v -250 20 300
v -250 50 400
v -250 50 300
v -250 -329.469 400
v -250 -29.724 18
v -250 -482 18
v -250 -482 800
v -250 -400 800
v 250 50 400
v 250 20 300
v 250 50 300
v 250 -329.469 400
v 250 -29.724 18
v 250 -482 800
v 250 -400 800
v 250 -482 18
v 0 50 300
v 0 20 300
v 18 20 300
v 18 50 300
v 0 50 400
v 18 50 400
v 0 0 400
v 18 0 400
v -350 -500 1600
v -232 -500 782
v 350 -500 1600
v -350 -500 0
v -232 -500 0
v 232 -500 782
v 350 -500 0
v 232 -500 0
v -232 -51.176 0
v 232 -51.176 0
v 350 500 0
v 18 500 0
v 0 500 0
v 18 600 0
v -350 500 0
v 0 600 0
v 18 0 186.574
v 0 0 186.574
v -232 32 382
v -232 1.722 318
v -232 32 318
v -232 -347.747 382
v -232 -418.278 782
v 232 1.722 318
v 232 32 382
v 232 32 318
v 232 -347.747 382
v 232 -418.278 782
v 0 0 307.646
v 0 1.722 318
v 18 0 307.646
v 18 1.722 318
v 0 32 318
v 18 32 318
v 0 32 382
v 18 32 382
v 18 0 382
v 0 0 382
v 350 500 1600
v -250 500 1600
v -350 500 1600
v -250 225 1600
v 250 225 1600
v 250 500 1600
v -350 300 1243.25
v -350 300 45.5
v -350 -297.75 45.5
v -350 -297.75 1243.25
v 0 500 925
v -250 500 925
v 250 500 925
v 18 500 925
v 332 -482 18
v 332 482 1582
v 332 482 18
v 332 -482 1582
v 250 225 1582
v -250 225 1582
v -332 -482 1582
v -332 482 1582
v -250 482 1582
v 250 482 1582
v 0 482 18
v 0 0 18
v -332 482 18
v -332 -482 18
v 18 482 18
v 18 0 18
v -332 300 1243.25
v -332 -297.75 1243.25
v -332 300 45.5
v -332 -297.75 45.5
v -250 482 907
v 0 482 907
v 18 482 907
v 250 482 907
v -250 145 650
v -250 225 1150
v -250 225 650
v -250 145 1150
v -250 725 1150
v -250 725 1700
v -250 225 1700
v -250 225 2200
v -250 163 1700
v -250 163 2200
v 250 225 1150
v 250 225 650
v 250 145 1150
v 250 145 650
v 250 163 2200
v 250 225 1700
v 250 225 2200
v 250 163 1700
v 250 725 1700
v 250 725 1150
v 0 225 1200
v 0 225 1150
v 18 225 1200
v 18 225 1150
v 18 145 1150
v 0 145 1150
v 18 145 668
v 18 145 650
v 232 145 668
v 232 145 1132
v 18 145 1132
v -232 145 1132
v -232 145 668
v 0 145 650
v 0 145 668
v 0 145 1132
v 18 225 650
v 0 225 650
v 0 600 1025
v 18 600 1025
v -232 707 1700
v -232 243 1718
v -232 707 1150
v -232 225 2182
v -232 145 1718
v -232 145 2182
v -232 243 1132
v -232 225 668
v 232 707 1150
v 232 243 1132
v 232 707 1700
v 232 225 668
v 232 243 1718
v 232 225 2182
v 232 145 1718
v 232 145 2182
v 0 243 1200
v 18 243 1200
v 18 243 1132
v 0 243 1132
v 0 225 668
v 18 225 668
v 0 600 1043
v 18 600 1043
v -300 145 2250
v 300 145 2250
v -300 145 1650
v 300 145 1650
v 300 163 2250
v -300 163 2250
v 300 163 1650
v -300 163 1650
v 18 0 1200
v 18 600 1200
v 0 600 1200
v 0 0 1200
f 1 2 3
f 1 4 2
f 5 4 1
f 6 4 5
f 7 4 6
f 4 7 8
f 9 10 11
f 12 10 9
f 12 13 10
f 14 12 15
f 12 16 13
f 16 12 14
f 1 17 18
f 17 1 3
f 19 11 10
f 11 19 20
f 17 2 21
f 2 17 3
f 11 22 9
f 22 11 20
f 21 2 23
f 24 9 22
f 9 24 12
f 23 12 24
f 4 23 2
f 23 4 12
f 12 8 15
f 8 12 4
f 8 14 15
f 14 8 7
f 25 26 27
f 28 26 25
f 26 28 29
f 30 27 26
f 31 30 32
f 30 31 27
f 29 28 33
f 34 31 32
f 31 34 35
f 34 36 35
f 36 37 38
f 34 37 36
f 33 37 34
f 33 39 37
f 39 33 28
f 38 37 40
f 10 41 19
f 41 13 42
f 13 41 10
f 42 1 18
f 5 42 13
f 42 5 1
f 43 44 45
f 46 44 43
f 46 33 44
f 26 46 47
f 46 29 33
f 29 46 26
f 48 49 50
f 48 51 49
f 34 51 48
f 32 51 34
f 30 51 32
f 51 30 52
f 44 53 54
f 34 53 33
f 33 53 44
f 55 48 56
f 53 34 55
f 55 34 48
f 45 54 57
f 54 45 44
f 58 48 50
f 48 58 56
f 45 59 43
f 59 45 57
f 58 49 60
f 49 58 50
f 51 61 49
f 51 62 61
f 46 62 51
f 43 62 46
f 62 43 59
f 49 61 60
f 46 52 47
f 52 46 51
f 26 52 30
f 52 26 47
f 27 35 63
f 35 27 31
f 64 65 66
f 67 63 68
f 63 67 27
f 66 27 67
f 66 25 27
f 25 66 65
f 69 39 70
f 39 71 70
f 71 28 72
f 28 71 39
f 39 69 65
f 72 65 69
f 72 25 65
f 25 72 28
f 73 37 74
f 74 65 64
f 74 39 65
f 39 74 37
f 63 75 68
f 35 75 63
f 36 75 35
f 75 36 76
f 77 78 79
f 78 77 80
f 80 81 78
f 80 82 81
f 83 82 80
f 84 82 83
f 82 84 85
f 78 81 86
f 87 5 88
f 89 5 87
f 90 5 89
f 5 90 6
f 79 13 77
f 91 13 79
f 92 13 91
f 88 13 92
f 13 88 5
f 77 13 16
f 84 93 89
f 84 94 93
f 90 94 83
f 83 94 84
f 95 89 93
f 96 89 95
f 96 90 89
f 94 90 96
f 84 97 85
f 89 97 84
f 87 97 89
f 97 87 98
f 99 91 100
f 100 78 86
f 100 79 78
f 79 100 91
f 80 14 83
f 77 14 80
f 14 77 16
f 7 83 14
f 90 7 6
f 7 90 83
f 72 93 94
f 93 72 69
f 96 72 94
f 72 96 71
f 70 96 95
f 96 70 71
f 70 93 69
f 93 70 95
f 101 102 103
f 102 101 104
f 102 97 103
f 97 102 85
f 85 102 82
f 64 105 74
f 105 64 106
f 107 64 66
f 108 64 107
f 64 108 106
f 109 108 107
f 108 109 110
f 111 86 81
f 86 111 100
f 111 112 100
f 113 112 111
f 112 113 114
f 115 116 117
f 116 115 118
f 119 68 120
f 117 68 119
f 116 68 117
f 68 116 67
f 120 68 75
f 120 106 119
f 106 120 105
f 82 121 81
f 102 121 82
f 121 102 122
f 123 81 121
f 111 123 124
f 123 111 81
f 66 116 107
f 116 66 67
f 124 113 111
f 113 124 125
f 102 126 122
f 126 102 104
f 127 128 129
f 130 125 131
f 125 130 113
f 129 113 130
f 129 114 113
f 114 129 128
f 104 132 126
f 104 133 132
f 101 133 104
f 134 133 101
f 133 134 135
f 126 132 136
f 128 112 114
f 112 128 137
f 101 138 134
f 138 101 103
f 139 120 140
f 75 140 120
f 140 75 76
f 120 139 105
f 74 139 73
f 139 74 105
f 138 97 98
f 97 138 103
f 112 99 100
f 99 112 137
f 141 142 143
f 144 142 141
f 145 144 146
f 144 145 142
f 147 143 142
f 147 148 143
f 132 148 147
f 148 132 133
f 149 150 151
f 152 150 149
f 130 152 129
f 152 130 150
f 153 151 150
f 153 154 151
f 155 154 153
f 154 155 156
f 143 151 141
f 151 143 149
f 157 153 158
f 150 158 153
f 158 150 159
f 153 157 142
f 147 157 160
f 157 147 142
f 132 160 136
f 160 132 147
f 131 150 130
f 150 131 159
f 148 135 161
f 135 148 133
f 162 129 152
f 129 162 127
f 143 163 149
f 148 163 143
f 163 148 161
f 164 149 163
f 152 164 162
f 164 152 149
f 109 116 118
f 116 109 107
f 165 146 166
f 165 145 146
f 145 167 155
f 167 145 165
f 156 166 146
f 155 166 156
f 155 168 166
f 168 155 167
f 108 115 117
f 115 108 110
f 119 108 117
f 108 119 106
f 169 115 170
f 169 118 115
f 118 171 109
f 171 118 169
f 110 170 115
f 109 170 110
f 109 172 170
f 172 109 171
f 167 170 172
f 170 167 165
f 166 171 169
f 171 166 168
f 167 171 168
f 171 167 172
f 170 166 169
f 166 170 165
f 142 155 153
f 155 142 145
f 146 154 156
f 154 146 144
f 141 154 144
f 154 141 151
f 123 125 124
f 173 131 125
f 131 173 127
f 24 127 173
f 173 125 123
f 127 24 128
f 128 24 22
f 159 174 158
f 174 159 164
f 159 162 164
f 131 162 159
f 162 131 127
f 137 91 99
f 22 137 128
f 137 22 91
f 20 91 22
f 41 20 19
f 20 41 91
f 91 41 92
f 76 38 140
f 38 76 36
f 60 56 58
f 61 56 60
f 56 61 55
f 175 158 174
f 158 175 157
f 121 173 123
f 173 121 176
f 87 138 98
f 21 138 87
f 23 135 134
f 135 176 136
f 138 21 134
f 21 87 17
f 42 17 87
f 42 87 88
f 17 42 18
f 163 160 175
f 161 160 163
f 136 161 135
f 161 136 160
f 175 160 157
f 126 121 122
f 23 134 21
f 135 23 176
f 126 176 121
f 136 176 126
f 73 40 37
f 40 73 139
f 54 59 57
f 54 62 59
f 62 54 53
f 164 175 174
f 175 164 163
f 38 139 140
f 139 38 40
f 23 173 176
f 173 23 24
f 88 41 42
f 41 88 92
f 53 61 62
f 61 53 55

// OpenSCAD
// file: ../shared/half_periscope.scad
diameter=10;
horizontal_leg=3;
vertical_leg=7;
wall_thickness=0.5;
flange=3;

module half_periscope(
    d=diameter,
    h=horizontal_leg,
    v=vertical_leg,
    w=wall_thickness,
    f=flange   
) {

  translate([-d/2,-(h+d/2),-d-v])
    rotate([90,0,90])
        difference(){
            union() {
            linear_extrude(d)
                polygon([[0,0], [h,0], [d+h,d], [d+h,d+v],[h,d+v],[h,d],[0,d]]);
             translate([0,-f/2,-f/2])
                cube([w,d+f,d+f]);
            }
            translate([0,0,w])
                linear_extrude(d-w-w)
                    polygon([[-w,w], [h,w], [d+h-w,d], [d+h-w,d+v+w],[h+w,d+v+w],[h+w,d-w],[-w,d-w]]);
    }  
    
  
        
   
}

half_periscope();
// file: ../shared/periscope.scad
diameter=20;
top_horizontal_tube_length=5;
top_flange=6;
bottom_horizontal_tube_length=2;
bottom_flange=3;
height=60;
wall_thickness=1;
twist=180;

use <half_periscope.scad>

module periscope(
    d=diameter,
    th=top_horizontal_tube_length,
    tf=top_flange,
    bh=bottom_horizontal_tube_length,
    bf=bottom_flange,
    h=height,
    w=wall_thickness,
    t=twist
) {
    translate([0,0,h/2])
    union() {
        half_periscope(d,bh,(h/2)-d,w,bf);
        translate([0,0,-w])
            rotate([0,180,t])
                half_periscope(d,th,((h/2)-d)+w,w,tf);
    }
}

periscope();
// file: ../shared/hollow_chair.scad
width=40;
height=80;
depth=55;
back_top=10;
top_angle=80;
seat_elevation=40;
seat_height=10;
seat_overhang=3;
bottom_angle=80;
wall_thickness=1.5;

module hollow_chair(
    w=width,
    h=height,
    d=depth,
    bt=back_top,
    ta=top_angle,
    se=seat_elevation,
    sh=seat_height,
    so=seat_overhang,
    ba=bottom_angle,
    wt=wall_thickness
){
    rotate([90,0,90])
    difference(){
    linear_extrude(w)
    polygon([
        [0,0],
        [d-so-tan(90-ba)*(se-sh),0],
        [d-so,se-sh],
        [d,se-sh],
        [d,se],
        [bt+tan(90-ta)*(h-se),se],
        [bt,h],
        [0,h]
    ]);
        translate([0,0,wt])
    linear_extrude(w-(2*wt))
    polygon([
        [-wt,-wt],[d-so-tan(90-ba)*(se-sh)-(wt/cos(90-ba)),-wt],
        [d-so-tan(90-ba)*(se-sh)-(wt/cos(90-ba)),0],
        [d-so-(wt/cos(90-ba)),se-sh+wt],
        [d-wt,se-sh+wt],
        [d-wt,se-wt],
        [bt+tan(90-ta)*(h-se)-(wt/cos(90-ta)),se-wt],
        [bt-(wt/cos(90-ta)),h-wt],
        [-wt,h-wt]
    ]);
}
    
 

}



hollow_chair();
// file: ../shared/box.scad
width =100;
depth =50;
height=200;
wall_thickness=1;

module box(w=width,d=depth,h=height,t=wall_thickness) {
    translate([0,0,h/2])
        difference() {
            cube([w,d,h],true);
            cube([w-2*t,d-2*t,h-2*t],true);
        }
}

box();
// main file
box_width=700;
box_height=1600;
box_depth=1000;
box_wall_thickness=18;

chair_width=500;
chair_height=800;
chair_depth=550;
chair_back_top=100;
chair_top_angle=80;
chair_seat_elevation=400;
chair_seat_height=100;
chair_seat_overhang=30;
chair_bottom_angle=80;
chair_wall_thickness=18;

periscope_diameter=500;
periscope_top_horizontal_tube_length=80;
periscope_top_flange=100;
periscope_bottom_horizontal_tube_length=80;
periscope_bottom_flange=0;
periscope_height=1550;
periscope_wall_thickness=18;
periscope_twist=0;
periscope_elevation=650;

door_width=600;
door_height=1200;
door_elevation=50;
door_offset_left=200;
door_angle=45;

// initial camera distance, rotation and translation
$vpd=10000;
$vpr=[75,0,315];
$vpt=[0,0,1000];

use <../shared/box.scad>
use <../shared/hollow_chair.scad>
use <../shared/periscope.scad>

module spiegelkijker(    
    bw=box_width,
    bh=box_height,
    bd=box_depth,
    bwt=box_wall_thickness,
    cw=chair_width,
    ch=chair_height,
    cd=chair_depth,
    cbt=chair_back_top,
    cta=chair_top_angle,
    cse=chair_seat_elevation,
    csh=chair_seat_height,
    cso=chair_seat_overhang,
    cba=chair_bottom_angle,
    cwt=chair_wall_thickness,
    dw=door_width,
    dh=door_height,
    de=door_elevation,
    dol=door_offset_left,
    da=door_angle,
    pd=periscope_diameter,
    pth=periscope_top_horizontal_tube_length,
    ptf=periscope_top_flange,
    pbh=periscope_bottom_horizontal_tube_length,
    pbf=periscope_bottom_flange,
    ph=periscope_height,
    pwt=periscope_wall_thickness,
    pt=periscope_twist,
    pe=periscope_elevation,
    ){
    union() {
        translate([-cw/2,-bd/2,0])
            hollow_chair(cw,ch,cd,cbt,cta,cse,csh,cso,cba,cwt);
        difference(){
            box(bw,bd,bh,bwt);
            // chair punch:
            translate([(cwt-cw)/2,(bd+cwt)/-2,cwt/-2])
                cube([cw-cwt,cd-cso-tan(90-cba)*(cse-csh),ch]);
            //door punch
            translate([0,bd/2-dol,de-bwt/4])
                rotate([0,0,180])
                    cube([bh,dw-bwt/8,dh-bwt/8]);
            //periscope_punch
            translate([pwt/2-pd/2,(cd+pwt)/2-0.1*pd,pe+0.55*pd])
            cube([pd-pwt,cd,ph]);
        }
        translate([0,cd/2+0.4*pd,pe])
            periscope(pd,pth,ptf,pbh,pbf,ph,pwt,pt);
        
            rotate([0,0,180]);
            cube([bwt,dw,dh]);
    }
}

spiegelkijker();
